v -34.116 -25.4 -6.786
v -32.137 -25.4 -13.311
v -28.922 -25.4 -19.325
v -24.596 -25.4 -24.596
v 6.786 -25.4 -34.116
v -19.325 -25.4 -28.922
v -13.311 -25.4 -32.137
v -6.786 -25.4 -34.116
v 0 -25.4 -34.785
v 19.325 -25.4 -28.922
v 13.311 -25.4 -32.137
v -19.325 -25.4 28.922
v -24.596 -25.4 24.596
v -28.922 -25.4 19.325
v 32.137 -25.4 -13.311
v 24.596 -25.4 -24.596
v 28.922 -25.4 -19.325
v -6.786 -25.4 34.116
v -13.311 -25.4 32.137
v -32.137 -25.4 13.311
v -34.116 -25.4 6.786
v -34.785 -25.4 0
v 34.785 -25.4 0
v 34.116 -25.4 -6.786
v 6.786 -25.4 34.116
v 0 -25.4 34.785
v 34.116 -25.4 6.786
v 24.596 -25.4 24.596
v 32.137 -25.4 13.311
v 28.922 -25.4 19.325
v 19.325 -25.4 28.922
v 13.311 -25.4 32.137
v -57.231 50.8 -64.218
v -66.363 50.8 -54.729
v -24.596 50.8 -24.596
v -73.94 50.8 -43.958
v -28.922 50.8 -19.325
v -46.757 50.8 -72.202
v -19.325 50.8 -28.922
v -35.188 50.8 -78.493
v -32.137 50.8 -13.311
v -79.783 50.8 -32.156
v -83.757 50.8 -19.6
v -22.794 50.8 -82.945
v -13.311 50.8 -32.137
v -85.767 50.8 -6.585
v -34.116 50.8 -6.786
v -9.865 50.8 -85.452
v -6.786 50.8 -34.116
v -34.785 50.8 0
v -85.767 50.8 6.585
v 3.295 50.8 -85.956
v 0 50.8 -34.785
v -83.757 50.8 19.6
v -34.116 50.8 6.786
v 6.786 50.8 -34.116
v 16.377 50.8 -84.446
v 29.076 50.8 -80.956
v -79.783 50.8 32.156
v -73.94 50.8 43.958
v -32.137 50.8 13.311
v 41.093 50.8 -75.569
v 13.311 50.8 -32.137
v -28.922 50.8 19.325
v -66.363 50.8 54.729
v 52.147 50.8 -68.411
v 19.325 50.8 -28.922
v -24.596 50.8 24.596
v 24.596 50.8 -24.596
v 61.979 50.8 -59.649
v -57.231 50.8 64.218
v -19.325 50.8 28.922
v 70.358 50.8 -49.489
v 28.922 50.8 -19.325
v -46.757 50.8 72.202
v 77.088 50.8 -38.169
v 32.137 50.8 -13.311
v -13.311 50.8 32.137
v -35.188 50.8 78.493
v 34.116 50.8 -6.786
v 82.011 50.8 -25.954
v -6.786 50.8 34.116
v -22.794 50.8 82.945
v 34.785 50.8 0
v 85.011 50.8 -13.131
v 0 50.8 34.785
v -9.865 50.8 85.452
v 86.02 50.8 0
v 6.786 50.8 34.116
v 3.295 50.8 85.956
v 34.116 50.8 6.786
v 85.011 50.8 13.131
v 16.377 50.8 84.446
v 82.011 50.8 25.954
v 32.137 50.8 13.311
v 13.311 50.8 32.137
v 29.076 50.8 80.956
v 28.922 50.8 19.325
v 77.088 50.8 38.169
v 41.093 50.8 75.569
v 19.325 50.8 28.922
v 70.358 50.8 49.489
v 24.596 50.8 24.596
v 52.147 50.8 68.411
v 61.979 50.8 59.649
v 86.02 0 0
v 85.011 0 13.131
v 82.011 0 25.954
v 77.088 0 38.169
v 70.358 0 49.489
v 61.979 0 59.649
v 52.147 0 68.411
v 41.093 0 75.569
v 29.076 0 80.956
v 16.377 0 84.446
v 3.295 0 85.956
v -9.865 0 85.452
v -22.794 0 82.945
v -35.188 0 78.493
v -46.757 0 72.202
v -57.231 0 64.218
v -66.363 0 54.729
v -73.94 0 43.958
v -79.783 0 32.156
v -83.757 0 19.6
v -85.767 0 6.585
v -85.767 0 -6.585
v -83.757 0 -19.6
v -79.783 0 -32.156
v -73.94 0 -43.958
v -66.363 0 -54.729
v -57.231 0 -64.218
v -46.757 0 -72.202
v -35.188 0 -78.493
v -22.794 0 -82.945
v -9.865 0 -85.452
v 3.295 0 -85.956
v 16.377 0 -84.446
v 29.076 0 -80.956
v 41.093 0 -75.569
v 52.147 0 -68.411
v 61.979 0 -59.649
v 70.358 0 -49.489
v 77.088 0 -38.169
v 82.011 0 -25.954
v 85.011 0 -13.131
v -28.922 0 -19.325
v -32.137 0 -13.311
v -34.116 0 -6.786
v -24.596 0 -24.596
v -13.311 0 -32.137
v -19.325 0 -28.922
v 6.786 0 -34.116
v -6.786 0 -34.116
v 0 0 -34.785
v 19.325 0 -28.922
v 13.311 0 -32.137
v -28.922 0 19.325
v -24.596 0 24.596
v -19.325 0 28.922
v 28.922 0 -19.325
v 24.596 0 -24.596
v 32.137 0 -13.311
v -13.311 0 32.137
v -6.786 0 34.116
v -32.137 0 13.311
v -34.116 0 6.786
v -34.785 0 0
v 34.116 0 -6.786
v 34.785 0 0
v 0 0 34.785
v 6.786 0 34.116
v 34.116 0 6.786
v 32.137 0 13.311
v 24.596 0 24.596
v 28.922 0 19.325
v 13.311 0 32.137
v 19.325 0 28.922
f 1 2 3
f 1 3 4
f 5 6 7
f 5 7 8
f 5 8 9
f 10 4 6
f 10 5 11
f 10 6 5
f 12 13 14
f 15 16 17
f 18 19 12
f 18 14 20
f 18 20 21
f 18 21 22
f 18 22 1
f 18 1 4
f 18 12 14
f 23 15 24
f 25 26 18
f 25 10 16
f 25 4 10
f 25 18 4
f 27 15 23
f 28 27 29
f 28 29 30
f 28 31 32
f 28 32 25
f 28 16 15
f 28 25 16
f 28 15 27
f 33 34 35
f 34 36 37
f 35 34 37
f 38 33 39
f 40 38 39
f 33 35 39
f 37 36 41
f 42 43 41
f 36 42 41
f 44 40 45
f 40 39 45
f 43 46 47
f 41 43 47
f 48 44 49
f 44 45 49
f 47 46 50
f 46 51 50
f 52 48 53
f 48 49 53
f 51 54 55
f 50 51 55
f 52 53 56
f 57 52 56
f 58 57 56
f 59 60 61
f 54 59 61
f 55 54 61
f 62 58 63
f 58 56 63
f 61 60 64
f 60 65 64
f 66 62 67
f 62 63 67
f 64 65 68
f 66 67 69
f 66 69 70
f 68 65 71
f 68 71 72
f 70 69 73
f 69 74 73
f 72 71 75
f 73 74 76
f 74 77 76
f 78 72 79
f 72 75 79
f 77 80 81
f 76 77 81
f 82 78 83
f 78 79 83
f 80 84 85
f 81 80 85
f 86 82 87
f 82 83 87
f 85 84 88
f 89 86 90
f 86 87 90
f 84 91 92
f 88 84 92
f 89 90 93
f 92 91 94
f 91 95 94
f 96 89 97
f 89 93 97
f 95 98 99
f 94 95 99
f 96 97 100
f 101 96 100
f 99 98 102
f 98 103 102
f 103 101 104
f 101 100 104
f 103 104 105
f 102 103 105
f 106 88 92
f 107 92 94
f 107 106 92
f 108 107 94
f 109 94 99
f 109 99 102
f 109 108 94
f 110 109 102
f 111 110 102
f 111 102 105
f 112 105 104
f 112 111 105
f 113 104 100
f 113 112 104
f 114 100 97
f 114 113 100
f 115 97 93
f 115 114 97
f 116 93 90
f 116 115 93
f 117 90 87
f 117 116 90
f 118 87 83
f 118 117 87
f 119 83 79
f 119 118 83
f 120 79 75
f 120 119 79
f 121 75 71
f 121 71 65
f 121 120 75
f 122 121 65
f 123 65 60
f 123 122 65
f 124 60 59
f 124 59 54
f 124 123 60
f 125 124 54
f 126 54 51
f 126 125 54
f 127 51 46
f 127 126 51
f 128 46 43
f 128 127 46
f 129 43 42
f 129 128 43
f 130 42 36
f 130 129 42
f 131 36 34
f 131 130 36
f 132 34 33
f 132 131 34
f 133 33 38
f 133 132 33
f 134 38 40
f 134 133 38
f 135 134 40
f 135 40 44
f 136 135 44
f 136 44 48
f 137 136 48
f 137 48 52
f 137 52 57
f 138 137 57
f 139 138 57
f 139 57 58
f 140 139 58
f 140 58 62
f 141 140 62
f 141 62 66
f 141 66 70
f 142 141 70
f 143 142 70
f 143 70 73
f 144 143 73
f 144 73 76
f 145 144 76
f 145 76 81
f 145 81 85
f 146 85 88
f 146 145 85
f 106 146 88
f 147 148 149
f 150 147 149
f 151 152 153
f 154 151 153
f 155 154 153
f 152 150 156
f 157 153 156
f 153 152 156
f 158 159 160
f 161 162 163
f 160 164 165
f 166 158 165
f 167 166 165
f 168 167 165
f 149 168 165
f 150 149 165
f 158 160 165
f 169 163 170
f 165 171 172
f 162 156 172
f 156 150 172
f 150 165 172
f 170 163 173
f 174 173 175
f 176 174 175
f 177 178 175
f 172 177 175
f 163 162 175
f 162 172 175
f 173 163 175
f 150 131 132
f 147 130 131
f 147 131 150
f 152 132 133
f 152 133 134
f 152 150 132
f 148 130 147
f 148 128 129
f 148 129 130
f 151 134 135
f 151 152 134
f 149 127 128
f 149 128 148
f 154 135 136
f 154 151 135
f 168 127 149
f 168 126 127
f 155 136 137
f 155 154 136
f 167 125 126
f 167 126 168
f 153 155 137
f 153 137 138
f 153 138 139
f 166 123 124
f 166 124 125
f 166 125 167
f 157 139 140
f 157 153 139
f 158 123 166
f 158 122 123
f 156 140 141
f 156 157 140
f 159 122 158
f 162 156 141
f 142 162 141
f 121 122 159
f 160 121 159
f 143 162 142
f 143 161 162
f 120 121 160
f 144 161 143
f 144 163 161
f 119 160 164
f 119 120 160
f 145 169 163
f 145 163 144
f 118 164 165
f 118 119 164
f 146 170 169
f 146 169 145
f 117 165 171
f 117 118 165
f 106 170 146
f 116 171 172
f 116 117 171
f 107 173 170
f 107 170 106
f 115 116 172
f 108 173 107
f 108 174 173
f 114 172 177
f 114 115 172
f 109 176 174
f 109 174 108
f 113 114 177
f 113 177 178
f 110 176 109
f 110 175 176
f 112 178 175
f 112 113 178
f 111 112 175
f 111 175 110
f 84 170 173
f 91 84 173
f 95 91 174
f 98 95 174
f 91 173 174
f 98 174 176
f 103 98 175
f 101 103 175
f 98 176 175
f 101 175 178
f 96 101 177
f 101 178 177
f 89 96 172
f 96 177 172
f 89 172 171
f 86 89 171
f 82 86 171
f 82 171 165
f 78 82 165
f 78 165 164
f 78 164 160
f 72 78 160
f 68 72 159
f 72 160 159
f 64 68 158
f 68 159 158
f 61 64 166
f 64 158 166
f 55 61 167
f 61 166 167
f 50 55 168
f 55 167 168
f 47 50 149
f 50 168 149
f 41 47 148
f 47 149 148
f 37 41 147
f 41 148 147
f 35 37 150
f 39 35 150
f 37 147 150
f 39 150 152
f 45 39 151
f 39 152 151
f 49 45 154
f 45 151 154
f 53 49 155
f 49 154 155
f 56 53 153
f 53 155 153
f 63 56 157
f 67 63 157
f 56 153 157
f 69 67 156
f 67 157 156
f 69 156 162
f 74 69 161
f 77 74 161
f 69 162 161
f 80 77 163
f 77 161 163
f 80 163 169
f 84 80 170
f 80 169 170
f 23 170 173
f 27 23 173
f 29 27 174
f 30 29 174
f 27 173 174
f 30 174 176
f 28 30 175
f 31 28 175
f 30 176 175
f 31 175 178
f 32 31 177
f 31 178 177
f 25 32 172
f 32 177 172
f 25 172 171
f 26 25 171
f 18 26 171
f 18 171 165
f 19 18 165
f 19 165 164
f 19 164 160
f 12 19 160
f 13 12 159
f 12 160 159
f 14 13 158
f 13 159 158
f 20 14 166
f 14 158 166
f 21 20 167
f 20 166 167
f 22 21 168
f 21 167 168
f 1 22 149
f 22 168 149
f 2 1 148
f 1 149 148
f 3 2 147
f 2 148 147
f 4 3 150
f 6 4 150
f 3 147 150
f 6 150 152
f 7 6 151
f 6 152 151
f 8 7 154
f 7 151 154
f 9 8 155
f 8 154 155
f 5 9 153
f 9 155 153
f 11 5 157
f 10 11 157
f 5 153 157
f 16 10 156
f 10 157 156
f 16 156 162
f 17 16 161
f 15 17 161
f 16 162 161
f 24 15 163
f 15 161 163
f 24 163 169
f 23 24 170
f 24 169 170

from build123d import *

# Parameters (mm, degrees)
F0_R     = 34.784526
F1_DEPTH = 25.4
F0_R_2   = 86.019603
F2_DEPTH = 50.8


with BuildPart() as f1:
    # F0 (on Front) → F1 (new body)
    with BuildSketch(Plane.XZ):
        Circle(F0_R)
    extrude(amount=F1_DEPTH)

    # F0 (on Front) → F2 (join)
    with BuildSketch(Plane.XZ):
        Circle(F0_R_2)
        Circle(F0_R, mode=Mode.SUBTRACT)
    extrude(amount=-F2_DEPTH)


solid = f1.part
